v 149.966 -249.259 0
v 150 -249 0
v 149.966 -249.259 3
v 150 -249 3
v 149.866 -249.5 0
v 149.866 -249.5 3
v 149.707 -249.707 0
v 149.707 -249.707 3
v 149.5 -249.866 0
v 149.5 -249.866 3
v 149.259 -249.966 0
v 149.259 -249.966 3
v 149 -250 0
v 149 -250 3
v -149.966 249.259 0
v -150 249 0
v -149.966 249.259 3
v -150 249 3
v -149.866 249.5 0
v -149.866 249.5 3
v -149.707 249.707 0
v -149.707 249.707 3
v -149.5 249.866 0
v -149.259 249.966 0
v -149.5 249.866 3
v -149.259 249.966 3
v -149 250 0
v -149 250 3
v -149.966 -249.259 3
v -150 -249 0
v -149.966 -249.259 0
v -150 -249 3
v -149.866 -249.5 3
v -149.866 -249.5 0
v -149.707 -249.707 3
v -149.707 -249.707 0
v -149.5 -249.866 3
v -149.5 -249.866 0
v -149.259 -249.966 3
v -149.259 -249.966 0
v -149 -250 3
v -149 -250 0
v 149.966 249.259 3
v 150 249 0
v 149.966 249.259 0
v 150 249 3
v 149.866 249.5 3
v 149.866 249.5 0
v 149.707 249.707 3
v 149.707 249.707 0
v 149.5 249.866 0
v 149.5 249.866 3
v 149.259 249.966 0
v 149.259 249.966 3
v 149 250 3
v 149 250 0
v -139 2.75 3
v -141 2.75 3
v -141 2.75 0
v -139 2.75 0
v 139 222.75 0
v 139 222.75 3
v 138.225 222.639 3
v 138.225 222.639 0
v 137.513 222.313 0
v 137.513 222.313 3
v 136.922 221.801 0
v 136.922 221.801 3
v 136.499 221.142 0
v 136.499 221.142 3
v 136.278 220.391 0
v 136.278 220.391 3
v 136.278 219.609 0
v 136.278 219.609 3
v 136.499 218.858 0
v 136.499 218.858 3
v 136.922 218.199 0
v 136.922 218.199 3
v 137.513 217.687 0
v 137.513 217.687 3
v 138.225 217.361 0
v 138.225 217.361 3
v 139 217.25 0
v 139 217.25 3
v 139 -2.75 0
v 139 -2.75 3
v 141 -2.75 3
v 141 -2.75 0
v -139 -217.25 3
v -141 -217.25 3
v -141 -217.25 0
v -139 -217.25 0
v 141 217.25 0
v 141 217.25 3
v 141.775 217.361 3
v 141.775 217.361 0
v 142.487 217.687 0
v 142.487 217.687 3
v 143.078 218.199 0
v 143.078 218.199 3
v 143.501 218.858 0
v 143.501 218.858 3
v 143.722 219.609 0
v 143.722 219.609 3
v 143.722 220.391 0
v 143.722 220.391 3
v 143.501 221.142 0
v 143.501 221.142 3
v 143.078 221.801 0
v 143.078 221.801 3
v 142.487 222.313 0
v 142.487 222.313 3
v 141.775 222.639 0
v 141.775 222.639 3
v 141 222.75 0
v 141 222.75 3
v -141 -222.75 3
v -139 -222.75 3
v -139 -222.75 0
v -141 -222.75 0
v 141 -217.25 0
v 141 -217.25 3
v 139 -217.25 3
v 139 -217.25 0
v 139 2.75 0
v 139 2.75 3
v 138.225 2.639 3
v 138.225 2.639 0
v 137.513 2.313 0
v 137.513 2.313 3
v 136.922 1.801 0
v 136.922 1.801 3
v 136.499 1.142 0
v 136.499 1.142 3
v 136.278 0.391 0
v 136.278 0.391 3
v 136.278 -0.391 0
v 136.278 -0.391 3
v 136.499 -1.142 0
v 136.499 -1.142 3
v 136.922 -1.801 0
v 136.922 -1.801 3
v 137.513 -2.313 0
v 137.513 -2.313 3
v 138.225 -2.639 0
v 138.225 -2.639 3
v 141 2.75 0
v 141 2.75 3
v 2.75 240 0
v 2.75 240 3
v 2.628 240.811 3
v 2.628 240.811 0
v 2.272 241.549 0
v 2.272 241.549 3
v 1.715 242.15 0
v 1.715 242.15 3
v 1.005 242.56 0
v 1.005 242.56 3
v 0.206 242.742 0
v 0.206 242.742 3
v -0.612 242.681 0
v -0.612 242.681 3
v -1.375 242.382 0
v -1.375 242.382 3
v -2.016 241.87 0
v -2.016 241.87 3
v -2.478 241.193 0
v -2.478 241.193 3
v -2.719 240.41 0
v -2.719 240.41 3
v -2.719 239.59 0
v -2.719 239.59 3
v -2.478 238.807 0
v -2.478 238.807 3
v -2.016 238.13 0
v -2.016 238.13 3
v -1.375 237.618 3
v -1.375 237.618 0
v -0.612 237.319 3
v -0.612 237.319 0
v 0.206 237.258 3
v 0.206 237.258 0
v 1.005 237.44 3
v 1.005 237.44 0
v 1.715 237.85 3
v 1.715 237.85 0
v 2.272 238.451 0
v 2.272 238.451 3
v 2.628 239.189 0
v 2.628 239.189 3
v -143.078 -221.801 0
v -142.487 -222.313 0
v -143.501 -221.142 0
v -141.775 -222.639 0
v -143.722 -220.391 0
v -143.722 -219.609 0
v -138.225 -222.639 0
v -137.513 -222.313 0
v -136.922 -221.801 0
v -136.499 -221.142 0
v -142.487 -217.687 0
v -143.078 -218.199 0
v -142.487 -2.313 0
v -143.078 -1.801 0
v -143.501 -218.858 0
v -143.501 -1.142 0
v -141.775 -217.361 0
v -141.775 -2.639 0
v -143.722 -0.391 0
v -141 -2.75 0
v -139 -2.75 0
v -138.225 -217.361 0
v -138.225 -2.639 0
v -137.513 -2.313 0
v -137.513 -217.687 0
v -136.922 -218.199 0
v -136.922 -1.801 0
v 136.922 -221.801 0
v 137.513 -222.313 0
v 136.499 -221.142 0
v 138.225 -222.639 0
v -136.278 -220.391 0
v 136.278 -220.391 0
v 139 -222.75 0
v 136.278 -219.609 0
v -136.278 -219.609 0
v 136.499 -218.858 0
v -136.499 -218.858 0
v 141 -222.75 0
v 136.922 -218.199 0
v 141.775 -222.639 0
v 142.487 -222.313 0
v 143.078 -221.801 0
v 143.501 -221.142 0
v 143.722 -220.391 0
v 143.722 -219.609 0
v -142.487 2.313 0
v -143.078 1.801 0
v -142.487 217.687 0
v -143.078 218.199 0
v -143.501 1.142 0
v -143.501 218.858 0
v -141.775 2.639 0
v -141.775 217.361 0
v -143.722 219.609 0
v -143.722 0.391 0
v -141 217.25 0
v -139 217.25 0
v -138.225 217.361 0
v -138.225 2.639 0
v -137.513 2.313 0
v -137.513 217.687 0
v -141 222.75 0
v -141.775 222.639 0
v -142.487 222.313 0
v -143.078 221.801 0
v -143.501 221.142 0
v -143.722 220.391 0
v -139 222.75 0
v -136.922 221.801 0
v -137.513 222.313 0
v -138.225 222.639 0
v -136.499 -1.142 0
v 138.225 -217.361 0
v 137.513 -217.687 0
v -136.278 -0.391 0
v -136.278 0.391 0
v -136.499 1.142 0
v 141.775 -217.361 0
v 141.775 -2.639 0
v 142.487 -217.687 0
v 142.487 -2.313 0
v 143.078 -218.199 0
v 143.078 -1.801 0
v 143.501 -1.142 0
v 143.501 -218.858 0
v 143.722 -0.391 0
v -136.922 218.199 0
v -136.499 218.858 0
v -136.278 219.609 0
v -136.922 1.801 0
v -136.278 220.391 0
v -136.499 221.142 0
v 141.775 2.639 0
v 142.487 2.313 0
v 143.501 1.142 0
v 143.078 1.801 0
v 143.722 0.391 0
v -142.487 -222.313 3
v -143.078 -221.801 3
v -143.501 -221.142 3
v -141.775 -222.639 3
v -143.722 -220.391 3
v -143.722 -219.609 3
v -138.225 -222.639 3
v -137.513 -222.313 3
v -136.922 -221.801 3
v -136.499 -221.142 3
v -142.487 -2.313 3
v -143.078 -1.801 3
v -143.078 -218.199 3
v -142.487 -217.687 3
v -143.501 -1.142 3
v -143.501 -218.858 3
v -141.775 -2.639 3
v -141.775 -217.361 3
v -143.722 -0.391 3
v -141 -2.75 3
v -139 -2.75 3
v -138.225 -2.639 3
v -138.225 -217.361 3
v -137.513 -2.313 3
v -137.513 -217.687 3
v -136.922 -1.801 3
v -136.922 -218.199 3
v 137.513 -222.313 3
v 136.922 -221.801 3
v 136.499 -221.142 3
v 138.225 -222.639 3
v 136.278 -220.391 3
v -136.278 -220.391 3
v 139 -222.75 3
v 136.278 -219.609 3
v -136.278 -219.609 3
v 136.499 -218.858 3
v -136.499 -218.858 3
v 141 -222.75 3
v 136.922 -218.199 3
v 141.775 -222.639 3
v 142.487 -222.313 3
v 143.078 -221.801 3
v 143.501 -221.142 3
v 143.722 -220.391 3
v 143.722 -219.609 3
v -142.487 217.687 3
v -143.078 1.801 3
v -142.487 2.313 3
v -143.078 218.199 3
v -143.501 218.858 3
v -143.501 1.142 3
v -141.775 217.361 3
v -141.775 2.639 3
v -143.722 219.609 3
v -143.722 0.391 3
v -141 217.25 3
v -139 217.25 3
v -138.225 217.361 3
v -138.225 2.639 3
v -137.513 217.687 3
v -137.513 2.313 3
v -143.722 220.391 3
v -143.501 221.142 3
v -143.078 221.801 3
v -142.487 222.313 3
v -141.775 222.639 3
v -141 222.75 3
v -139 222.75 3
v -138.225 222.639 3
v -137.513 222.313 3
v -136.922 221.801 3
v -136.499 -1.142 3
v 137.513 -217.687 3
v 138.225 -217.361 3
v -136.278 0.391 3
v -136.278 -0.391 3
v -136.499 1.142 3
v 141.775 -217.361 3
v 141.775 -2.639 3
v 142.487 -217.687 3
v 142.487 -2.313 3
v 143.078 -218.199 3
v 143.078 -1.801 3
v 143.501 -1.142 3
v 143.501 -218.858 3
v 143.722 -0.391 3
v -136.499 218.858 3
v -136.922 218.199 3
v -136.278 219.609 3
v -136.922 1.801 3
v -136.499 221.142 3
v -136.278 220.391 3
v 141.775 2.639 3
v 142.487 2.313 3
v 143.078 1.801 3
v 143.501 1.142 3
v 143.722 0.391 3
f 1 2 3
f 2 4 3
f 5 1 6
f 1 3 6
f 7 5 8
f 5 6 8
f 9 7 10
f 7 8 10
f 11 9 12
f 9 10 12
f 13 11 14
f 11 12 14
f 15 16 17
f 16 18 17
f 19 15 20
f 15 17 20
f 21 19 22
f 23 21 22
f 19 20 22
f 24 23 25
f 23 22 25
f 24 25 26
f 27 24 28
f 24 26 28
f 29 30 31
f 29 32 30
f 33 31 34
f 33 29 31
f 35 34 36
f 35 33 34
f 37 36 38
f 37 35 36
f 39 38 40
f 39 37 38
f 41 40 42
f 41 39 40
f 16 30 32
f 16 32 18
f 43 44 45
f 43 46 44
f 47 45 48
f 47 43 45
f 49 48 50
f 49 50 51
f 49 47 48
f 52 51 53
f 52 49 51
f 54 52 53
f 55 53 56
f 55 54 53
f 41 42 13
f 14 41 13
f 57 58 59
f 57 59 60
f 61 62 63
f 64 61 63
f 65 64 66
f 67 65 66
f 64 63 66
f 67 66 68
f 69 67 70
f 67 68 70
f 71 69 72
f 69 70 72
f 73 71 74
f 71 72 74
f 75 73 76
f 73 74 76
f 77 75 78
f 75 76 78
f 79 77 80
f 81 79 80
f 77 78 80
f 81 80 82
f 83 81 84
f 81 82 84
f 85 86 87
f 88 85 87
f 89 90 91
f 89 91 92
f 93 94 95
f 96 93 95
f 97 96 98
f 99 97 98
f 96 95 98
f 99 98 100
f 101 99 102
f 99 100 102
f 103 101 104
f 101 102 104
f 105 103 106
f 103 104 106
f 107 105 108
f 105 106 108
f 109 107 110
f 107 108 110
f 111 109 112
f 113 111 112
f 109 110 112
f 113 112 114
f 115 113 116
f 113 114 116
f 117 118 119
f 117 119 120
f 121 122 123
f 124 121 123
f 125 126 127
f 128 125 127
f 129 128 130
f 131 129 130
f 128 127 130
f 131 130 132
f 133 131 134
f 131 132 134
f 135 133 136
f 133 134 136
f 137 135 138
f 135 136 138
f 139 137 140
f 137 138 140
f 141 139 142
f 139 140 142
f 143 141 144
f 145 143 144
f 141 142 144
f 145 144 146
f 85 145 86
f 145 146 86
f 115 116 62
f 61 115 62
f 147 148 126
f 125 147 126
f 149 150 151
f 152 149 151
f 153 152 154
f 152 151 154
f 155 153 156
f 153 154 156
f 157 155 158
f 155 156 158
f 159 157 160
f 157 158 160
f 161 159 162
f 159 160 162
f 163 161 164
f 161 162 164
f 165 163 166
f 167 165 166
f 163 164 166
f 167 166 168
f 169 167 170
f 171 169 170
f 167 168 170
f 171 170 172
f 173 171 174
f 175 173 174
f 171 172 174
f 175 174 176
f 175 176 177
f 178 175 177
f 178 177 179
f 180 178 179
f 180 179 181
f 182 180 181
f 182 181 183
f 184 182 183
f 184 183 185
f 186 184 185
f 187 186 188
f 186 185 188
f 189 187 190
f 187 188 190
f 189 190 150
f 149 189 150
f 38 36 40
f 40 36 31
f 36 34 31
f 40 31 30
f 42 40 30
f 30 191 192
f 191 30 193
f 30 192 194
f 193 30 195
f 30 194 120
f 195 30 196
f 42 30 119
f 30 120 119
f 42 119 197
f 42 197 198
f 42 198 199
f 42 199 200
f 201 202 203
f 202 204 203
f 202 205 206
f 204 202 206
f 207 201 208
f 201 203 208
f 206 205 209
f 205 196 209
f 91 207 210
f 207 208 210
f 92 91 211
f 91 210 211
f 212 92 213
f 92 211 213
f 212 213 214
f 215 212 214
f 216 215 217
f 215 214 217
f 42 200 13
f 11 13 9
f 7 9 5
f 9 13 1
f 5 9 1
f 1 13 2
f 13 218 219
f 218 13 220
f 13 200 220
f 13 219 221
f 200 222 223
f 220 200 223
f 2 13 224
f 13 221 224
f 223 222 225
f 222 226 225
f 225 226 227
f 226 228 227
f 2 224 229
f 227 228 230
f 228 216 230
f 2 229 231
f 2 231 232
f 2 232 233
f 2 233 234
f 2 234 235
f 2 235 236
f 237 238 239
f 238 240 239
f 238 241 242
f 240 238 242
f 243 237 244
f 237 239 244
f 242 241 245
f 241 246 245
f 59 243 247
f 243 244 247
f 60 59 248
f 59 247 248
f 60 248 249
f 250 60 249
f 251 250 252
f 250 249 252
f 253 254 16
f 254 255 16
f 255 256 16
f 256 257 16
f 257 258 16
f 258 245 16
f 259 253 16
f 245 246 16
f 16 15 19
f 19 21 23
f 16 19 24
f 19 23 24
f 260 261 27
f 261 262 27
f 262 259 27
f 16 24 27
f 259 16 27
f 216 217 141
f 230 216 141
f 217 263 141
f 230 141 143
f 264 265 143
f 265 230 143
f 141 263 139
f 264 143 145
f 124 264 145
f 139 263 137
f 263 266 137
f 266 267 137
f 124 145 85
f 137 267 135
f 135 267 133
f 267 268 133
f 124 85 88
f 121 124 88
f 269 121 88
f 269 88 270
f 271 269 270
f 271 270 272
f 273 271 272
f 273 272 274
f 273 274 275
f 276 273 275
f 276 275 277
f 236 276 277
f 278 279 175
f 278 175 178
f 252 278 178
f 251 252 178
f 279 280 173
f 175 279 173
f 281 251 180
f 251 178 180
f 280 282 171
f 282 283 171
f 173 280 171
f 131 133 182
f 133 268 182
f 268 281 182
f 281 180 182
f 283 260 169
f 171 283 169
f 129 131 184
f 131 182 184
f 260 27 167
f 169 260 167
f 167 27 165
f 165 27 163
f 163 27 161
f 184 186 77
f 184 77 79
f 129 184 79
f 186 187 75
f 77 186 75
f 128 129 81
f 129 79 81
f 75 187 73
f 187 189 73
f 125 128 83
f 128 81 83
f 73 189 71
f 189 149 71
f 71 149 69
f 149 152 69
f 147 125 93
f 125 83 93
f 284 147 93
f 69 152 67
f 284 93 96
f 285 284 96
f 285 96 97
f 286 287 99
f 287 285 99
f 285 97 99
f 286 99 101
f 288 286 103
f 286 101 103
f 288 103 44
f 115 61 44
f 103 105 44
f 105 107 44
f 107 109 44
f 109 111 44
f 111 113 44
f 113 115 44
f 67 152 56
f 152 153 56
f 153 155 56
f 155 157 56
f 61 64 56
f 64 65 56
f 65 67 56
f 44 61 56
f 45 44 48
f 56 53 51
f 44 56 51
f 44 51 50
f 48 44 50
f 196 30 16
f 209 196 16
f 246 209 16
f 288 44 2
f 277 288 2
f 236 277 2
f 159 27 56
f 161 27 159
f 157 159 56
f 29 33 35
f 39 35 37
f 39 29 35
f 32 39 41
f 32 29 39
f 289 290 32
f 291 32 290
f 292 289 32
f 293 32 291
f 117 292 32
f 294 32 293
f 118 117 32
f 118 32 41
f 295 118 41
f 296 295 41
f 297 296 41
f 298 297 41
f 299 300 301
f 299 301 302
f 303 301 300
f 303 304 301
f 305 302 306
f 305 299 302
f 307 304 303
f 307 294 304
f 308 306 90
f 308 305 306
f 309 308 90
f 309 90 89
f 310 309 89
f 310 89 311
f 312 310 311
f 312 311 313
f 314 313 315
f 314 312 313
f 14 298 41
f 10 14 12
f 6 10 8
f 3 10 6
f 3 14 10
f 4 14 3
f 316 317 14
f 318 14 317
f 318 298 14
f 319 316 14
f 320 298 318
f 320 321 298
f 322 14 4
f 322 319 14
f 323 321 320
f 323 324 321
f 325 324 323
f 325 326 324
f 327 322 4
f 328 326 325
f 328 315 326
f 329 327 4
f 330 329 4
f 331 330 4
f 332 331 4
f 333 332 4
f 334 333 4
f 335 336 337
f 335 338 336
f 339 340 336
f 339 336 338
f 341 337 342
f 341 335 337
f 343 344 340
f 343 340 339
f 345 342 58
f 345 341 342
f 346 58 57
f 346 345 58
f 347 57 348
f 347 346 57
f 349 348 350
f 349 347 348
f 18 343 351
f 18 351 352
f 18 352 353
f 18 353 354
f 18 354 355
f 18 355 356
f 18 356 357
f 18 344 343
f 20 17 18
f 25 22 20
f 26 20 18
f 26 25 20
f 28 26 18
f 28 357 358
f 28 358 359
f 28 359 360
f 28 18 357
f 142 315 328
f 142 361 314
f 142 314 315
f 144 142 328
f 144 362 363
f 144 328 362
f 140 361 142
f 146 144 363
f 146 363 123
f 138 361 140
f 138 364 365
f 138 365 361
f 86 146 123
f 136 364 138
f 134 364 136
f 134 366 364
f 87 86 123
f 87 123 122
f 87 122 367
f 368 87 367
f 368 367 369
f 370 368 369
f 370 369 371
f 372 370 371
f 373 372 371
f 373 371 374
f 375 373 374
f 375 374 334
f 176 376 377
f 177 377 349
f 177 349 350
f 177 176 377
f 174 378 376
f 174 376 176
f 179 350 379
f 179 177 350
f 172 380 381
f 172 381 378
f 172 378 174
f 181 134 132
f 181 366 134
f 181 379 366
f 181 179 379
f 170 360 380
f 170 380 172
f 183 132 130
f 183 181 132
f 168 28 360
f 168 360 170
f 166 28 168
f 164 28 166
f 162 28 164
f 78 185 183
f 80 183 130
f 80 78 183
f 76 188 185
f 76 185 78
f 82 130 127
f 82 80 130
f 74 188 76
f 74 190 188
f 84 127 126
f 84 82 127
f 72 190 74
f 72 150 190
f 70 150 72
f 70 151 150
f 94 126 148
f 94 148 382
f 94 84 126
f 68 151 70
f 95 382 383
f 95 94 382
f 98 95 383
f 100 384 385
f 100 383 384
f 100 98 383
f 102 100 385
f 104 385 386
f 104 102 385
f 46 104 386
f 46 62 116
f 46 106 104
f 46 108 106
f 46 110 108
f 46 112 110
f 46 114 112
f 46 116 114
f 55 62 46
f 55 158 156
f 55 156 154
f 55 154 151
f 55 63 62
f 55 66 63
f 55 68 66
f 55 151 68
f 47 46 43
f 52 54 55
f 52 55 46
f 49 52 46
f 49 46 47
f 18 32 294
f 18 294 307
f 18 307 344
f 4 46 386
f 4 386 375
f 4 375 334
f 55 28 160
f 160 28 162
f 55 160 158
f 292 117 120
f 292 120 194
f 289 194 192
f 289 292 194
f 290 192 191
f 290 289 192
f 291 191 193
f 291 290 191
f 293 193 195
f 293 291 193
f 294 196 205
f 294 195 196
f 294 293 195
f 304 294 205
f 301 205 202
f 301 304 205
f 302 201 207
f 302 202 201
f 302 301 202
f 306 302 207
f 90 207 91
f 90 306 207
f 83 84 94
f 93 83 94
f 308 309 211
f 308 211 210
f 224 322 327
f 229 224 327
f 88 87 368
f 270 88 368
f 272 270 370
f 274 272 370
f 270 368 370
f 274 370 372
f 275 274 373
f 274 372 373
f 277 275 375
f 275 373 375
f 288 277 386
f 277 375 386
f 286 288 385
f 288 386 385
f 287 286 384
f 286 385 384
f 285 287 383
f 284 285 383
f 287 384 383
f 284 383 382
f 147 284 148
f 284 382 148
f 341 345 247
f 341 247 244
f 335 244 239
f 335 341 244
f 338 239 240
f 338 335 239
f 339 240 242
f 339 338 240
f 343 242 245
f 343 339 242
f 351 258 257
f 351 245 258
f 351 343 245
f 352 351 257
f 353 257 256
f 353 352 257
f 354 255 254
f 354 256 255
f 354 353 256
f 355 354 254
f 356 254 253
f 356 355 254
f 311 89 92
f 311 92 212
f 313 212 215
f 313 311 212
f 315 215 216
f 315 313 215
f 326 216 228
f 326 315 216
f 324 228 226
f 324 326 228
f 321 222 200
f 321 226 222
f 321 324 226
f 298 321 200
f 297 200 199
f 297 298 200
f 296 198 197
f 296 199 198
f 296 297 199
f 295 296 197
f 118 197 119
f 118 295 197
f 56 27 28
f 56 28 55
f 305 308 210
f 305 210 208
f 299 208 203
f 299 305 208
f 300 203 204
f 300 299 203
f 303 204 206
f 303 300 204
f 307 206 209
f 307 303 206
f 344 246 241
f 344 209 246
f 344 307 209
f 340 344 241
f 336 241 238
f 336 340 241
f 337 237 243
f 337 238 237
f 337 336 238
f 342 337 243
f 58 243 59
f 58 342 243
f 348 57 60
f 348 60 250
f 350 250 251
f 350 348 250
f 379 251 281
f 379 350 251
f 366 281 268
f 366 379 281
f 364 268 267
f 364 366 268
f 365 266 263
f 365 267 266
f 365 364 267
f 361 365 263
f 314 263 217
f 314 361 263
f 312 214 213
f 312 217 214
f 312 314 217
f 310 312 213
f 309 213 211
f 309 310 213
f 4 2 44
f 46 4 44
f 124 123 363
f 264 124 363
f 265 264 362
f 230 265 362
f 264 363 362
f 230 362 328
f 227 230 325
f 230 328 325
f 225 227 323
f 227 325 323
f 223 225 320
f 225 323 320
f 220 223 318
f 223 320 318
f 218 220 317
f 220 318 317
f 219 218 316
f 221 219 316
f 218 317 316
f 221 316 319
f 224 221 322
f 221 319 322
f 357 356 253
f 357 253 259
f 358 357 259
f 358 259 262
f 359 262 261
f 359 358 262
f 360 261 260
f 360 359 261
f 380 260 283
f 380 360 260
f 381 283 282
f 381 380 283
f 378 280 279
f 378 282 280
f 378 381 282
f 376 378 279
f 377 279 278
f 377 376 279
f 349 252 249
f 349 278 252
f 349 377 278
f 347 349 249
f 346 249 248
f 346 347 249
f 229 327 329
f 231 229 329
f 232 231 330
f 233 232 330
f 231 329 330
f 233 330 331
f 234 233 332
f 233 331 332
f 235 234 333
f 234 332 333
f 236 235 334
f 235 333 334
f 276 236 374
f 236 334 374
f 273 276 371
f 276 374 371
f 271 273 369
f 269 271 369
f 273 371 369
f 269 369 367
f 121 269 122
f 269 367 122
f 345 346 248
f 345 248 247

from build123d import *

# Parameters (mm, degrees)
SKETCH1_W           = 300
SKETCH1_H           = 500
BOSS_EXTRUDE1_DEPTH = 3
SKETCH2_R           = 2.75
CUT_EXTRUDE1_DEPTH  = 10
FILLET1_R           = 1


with BuildPart() as part:
    # Sketch1 → Boss-Extrude1 (new body)
    with BuildSketch(Plane.XY):
        Rectangle(SKETCH1_W, SKETCH1_H)
    extrude(amount=BOSS_EXTRUDE1_DEPTH)

    # Sketch2 → Cut-Extrude1 (cut)
    with BuildSketch(Plane.XY.offset(3)):
        with Locations((0, 240)):
            Circle(SKETCH2_R)
        with BuildLine():
            Line((-141, -217.25), (-139, -217.25))
            ThreePointArc((-139, -217.25), (-136.25, -220), (-139, -222.75))
            Line((-139, -222.75), (-141, -222.75))
            ThreePointArc((-141, -222.75), (-143.75, -220), (-141, -217.25))
        make_face()
        with BuildLine():
            Line((-141, 222.75), (-139, 222.75))
            ThreePointArc((-139, 222.75), (-136.25, 220), (-139, 217.25))
            Line((-139, 217.25), (-141, 217.25))
            ThreePointArc((-141, 217.25), (-143.75, 220), (-141, 222.75))
        make_face()
        with BuildLine():
            Line((-141, 2.75), (-139, 2.75))
            ThreePointArc((-139, 2.75), (-136.25, 0), (-139, -2.75))
            Line((-139, -2.75), (-141, -2.75))
            ThreePointArc((-141, -2.75), (-143.75, 0), (-141, 2.75))
        make_face()
    cut_extrude1 = extrude(amount=-CUT_EXTRUDE1_DEPTH, mode=Mode.SUBTRACT)

    # Mirror1: Cut-Extrude1 across plane
    add(cut_extrude1.mirror(Plane(origin=(0, 0, 0), x_dir=(0, 0, 1), z_dir=(1, 0, 0))), mode=Mode.SUBTRACT)

    # Fillet1
    fillet1_edges = [part.edges().sort_by_distance(p)[0] for p in [
        (-150, 250, 1.5),
        (150, 250, 1.5),
        (150, -250, 1.5),
        (-150, -250, 1.5),
    ]]
    fillet(fillet1_edges, radius=FILLET1_R)


solid = part.part
